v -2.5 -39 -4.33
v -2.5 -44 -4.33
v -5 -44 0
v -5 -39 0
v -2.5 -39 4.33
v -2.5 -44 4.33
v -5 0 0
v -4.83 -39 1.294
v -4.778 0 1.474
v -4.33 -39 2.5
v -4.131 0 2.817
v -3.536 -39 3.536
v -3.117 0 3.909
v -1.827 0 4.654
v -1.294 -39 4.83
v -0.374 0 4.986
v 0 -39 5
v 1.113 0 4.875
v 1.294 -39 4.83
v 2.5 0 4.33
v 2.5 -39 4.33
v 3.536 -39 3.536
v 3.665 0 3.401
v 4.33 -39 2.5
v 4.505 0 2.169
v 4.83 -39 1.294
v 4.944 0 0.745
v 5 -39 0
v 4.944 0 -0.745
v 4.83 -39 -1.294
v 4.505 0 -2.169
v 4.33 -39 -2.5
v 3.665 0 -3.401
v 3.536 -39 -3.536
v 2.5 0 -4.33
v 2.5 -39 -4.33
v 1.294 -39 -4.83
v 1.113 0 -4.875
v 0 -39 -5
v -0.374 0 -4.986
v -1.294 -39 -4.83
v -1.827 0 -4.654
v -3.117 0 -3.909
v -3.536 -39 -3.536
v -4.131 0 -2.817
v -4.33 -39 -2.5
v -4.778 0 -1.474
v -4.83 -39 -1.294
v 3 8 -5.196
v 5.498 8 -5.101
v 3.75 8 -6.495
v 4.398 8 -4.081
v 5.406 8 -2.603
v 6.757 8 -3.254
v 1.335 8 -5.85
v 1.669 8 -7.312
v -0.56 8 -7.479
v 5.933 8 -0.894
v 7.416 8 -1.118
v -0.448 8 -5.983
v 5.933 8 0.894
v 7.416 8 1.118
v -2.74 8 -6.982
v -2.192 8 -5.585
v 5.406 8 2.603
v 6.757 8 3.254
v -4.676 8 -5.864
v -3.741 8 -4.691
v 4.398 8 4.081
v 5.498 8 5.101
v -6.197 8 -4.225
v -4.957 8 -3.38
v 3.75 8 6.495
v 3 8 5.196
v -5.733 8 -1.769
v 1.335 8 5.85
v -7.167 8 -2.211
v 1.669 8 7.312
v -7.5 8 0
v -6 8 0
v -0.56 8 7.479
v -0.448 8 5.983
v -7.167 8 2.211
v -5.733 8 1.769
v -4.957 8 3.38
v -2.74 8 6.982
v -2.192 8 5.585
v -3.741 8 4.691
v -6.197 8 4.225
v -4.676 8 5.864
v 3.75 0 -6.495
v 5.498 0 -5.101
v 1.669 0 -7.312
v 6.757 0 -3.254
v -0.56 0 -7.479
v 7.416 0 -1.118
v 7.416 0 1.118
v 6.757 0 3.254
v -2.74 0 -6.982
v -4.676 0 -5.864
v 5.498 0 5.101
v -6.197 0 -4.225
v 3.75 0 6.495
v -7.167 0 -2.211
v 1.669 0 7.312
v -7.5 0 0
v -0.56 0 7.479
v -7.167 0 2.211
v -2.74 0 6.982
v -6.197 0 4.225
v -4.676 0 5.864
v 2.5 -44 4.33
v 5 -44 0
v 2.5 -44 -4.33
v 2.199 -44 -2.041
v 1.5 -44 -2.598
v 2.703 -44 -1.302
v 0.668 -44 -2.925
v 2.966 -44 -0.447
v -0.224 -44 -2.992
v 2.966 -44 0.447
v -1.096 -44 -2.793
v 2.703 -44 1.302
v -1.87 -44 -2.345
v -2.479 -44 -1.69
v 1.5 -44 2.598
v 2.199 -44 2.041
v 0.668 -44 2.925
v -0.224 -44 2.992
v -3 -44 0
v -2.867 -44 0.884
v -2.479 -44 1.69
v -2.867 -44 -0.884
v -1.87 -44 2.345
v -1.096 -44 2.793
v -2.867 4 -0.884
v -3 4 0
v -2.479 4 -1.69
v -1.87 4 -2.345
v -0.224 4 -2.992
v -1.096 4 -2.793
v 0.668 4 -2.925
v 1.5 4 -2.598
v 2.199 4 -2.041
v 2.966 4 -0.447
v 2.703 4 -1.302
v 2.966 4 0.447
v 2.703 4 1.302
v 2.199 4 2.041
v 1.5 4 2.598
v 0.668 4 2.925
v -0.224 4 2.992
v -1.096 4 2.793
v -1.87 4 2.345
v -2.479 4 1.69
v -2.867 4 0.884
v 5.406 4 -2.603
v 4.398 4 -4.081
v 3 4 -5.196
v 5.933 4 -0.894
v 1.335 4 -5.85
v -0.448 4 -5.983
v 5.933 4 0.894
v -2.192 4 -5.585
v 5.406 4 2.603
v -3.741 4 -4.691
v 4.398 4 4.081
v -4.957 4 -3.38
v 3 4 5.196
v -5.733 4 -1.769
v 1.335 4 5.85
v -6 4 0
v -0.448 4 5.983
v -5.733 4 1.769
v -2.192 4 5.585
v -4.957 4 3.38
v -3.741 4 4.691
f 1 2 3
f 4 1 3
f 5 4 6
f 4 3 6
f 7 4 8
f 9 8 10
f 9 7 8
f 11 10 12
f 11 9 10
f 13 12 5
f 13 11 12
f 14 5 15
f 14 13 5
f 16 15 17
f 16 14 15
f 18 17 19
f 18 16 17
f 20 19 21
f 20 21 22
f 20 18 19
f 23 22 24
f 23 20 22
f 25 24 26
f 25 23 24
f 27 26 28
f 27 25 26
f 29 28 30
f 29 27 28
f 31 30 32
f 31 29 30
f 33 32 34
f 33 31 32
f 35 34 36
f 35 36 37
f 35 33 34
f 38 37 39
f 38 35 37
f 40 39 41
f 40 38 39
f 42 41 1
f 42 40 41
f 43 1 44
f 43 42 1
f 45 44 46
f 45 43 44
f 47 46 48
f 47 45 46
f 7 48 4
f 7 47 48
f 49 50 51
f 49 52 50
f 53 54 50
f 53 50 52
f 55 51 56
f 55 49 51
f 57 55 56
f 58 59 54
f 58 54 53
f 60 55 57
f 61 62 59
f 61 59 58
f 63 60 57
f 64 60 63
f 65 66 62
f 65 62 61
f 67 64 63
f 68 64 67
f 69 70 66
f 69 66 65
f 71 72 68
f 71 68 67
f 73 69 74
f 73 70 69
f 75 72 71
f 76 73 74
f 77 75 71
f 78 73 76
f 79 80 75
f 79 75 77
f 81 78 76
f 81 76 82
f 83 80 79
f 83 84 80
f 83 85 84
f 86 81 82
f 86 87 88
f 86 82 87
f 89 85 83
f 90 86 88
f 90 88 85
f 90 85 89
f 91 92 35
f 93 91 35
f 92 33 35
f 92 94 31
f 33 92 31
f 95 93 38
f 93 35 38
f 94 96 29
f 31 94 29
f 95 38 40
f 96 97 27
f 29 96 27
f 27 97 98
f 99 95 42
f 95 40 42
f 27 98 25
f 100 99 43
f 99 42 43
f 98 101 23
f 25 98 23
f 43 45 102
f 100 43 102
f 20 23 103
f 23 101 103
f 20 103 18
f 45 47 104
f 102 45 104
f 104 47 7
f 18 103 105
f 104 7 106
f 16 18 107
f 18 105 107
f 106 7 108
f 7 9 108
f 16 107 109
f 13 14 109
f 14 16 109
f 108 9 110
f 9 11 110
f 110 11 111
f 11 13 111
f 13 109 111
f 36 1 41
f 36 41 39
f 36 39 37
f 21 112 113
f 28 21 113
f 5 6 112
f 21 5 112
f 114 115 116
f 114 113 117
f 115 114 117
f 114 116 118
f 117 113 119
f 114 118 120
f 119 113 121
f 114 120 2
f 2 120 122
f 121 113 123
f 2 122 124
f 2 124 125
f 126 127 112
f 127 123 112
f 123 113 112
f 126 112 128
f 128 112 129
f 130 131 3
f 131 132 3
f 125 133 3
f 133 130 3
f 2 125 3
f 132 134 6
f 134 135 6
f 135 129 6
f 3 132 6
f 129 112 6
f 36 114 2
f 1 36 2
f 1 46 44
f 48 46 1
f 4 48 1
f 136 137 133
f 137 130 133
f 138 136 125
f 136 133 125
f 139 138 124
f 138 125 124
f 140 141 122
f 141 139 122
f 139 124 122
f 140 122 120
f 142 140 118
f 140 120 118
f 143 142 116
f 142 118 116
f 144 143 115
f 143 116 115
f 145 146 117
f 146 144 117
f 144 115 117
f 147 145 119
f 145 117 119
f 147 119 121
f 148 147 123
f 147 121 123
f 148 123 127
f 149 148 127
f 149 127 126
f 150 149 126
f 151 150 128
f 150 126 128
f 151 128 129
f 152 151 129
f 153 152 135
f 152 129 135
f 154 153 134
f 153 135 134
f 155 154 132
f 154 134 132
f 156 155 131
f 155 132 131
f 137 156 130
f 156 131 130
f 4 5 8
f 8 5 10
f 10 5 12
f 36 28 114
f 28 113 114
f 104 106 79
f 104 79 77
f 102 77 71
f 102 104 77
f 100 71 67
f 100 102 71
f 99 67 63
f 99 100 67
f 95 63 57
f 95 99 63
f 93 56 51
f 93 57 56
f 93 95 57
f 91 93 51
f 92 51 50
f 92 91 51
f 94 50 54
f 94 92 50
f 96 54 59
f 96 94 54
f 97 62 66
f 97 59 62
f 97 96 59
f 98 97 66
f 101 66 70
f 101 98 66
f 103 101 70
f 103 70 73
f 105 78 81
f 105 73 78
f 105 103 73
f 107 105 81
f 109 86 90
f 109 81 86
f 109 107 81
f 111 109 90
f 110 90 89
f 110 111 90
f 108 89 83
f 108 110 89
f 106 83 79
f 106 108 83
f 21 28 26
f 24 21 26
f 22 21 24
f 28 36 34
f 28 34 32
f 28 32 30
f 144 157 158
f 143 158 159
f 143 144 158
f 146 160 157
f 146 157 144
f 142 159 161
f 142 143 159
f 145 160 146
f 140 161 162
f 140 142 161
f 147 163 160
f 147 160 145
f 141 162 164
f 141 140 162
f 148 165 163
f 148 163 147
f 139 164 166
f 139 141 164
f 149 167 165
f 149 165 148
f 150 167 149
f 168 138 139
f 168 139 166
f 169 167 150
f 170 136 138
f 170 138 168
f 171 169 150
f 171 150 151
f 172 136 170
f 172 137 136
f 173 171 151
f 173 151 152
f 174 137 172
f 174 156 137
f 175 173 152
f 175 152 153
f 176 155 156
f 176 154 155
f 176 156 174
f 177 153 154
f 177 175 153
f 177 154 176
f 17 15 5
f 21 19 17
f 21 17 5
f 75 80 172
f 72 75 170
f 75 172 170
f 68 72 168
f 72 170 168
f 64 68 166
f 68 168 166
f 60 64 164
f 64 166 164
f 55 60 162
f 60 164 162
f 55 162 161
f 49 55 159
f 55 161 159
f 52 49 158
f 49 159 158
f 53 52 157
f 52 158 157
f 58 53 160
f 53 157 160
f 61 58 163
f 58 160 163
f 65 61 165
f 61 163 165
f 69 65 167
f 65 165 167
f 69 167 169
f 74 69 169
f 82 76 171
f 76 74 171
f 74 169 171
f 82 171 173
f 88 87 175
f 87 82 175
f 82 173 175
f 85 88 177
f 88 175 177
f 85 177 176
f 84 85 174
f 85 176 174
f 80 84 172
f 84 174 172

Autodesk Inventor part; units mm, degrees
ref_plane "YZ Plane" through (0, 0, 0) normal (1, 0, 0) x (0, 1, 0)
ref_plane "XZ Plane" through (0, 0, 0) normal (0, 1, 0) x (-1, 0, 0)
ref_plane "XY Plane" through (0, 0, 0) normal (0, 0, 1) x (1, 0, 0)
sketch "Sketch1" plane through (0, 0, 0) normal (0, 1, 0) x (-1, 0, 0)
  circle A0 centre (0, 0) radius 7.5
  circle A1 centre (0, 0) radius 5
  circle A2 centre (0, 0) radius 4
  circle A3 centre (0, 0) radius 3
  circle A4 centre (0, 0) radius 6
  dimension "d0" = 15
  dimension "d1" = 10
  dimension "d2" = 8
  dimension "d7" = 6
  dimension "d8" = 12
extrude "Extrusion1" add sketch "Sketch1" along normal blind 8 contours A0
extrude "Extrusion2" add sketch "Sketch1" against normal blind 44 contours A1 | A2
extrude "Extrusion3" add sketch "Sketch1" along normal blind 4 contours A0 | A1 | A2 | A4
sketch "Sketch2" plane through (0, -44, 0) normal (0, -1, 0) x (1, 0, 0)
  circle A0 centre (0, 0) radius 5 projected
  line L0 (5, 0) -> (2.5, -4.3301)
  line L1 (2.5, -4.3301) -> (-2.5, -4.3301)
  line L2 (-2.5, -4.3301) -> (-5, 0)
  line L3 (-5, 0) -> (-2.5, 4.3301)
  line L4 (-2.5, 4.3301) -> (2.5, 4.3301)
  line L5 (2.5, 4.3301) -> (5, 0)
  circle A1 centre (0, 0) radius 5
  dimension "d11" = 10
extrude "Extrusion4" cut sketch "Sketch2" against normal blind 5 contours L5 A0 | A0 L0 | L4 A0 | A0 L1 | L3 A0 | A0 L2
properties part number "vacuum-gear-shaft"
